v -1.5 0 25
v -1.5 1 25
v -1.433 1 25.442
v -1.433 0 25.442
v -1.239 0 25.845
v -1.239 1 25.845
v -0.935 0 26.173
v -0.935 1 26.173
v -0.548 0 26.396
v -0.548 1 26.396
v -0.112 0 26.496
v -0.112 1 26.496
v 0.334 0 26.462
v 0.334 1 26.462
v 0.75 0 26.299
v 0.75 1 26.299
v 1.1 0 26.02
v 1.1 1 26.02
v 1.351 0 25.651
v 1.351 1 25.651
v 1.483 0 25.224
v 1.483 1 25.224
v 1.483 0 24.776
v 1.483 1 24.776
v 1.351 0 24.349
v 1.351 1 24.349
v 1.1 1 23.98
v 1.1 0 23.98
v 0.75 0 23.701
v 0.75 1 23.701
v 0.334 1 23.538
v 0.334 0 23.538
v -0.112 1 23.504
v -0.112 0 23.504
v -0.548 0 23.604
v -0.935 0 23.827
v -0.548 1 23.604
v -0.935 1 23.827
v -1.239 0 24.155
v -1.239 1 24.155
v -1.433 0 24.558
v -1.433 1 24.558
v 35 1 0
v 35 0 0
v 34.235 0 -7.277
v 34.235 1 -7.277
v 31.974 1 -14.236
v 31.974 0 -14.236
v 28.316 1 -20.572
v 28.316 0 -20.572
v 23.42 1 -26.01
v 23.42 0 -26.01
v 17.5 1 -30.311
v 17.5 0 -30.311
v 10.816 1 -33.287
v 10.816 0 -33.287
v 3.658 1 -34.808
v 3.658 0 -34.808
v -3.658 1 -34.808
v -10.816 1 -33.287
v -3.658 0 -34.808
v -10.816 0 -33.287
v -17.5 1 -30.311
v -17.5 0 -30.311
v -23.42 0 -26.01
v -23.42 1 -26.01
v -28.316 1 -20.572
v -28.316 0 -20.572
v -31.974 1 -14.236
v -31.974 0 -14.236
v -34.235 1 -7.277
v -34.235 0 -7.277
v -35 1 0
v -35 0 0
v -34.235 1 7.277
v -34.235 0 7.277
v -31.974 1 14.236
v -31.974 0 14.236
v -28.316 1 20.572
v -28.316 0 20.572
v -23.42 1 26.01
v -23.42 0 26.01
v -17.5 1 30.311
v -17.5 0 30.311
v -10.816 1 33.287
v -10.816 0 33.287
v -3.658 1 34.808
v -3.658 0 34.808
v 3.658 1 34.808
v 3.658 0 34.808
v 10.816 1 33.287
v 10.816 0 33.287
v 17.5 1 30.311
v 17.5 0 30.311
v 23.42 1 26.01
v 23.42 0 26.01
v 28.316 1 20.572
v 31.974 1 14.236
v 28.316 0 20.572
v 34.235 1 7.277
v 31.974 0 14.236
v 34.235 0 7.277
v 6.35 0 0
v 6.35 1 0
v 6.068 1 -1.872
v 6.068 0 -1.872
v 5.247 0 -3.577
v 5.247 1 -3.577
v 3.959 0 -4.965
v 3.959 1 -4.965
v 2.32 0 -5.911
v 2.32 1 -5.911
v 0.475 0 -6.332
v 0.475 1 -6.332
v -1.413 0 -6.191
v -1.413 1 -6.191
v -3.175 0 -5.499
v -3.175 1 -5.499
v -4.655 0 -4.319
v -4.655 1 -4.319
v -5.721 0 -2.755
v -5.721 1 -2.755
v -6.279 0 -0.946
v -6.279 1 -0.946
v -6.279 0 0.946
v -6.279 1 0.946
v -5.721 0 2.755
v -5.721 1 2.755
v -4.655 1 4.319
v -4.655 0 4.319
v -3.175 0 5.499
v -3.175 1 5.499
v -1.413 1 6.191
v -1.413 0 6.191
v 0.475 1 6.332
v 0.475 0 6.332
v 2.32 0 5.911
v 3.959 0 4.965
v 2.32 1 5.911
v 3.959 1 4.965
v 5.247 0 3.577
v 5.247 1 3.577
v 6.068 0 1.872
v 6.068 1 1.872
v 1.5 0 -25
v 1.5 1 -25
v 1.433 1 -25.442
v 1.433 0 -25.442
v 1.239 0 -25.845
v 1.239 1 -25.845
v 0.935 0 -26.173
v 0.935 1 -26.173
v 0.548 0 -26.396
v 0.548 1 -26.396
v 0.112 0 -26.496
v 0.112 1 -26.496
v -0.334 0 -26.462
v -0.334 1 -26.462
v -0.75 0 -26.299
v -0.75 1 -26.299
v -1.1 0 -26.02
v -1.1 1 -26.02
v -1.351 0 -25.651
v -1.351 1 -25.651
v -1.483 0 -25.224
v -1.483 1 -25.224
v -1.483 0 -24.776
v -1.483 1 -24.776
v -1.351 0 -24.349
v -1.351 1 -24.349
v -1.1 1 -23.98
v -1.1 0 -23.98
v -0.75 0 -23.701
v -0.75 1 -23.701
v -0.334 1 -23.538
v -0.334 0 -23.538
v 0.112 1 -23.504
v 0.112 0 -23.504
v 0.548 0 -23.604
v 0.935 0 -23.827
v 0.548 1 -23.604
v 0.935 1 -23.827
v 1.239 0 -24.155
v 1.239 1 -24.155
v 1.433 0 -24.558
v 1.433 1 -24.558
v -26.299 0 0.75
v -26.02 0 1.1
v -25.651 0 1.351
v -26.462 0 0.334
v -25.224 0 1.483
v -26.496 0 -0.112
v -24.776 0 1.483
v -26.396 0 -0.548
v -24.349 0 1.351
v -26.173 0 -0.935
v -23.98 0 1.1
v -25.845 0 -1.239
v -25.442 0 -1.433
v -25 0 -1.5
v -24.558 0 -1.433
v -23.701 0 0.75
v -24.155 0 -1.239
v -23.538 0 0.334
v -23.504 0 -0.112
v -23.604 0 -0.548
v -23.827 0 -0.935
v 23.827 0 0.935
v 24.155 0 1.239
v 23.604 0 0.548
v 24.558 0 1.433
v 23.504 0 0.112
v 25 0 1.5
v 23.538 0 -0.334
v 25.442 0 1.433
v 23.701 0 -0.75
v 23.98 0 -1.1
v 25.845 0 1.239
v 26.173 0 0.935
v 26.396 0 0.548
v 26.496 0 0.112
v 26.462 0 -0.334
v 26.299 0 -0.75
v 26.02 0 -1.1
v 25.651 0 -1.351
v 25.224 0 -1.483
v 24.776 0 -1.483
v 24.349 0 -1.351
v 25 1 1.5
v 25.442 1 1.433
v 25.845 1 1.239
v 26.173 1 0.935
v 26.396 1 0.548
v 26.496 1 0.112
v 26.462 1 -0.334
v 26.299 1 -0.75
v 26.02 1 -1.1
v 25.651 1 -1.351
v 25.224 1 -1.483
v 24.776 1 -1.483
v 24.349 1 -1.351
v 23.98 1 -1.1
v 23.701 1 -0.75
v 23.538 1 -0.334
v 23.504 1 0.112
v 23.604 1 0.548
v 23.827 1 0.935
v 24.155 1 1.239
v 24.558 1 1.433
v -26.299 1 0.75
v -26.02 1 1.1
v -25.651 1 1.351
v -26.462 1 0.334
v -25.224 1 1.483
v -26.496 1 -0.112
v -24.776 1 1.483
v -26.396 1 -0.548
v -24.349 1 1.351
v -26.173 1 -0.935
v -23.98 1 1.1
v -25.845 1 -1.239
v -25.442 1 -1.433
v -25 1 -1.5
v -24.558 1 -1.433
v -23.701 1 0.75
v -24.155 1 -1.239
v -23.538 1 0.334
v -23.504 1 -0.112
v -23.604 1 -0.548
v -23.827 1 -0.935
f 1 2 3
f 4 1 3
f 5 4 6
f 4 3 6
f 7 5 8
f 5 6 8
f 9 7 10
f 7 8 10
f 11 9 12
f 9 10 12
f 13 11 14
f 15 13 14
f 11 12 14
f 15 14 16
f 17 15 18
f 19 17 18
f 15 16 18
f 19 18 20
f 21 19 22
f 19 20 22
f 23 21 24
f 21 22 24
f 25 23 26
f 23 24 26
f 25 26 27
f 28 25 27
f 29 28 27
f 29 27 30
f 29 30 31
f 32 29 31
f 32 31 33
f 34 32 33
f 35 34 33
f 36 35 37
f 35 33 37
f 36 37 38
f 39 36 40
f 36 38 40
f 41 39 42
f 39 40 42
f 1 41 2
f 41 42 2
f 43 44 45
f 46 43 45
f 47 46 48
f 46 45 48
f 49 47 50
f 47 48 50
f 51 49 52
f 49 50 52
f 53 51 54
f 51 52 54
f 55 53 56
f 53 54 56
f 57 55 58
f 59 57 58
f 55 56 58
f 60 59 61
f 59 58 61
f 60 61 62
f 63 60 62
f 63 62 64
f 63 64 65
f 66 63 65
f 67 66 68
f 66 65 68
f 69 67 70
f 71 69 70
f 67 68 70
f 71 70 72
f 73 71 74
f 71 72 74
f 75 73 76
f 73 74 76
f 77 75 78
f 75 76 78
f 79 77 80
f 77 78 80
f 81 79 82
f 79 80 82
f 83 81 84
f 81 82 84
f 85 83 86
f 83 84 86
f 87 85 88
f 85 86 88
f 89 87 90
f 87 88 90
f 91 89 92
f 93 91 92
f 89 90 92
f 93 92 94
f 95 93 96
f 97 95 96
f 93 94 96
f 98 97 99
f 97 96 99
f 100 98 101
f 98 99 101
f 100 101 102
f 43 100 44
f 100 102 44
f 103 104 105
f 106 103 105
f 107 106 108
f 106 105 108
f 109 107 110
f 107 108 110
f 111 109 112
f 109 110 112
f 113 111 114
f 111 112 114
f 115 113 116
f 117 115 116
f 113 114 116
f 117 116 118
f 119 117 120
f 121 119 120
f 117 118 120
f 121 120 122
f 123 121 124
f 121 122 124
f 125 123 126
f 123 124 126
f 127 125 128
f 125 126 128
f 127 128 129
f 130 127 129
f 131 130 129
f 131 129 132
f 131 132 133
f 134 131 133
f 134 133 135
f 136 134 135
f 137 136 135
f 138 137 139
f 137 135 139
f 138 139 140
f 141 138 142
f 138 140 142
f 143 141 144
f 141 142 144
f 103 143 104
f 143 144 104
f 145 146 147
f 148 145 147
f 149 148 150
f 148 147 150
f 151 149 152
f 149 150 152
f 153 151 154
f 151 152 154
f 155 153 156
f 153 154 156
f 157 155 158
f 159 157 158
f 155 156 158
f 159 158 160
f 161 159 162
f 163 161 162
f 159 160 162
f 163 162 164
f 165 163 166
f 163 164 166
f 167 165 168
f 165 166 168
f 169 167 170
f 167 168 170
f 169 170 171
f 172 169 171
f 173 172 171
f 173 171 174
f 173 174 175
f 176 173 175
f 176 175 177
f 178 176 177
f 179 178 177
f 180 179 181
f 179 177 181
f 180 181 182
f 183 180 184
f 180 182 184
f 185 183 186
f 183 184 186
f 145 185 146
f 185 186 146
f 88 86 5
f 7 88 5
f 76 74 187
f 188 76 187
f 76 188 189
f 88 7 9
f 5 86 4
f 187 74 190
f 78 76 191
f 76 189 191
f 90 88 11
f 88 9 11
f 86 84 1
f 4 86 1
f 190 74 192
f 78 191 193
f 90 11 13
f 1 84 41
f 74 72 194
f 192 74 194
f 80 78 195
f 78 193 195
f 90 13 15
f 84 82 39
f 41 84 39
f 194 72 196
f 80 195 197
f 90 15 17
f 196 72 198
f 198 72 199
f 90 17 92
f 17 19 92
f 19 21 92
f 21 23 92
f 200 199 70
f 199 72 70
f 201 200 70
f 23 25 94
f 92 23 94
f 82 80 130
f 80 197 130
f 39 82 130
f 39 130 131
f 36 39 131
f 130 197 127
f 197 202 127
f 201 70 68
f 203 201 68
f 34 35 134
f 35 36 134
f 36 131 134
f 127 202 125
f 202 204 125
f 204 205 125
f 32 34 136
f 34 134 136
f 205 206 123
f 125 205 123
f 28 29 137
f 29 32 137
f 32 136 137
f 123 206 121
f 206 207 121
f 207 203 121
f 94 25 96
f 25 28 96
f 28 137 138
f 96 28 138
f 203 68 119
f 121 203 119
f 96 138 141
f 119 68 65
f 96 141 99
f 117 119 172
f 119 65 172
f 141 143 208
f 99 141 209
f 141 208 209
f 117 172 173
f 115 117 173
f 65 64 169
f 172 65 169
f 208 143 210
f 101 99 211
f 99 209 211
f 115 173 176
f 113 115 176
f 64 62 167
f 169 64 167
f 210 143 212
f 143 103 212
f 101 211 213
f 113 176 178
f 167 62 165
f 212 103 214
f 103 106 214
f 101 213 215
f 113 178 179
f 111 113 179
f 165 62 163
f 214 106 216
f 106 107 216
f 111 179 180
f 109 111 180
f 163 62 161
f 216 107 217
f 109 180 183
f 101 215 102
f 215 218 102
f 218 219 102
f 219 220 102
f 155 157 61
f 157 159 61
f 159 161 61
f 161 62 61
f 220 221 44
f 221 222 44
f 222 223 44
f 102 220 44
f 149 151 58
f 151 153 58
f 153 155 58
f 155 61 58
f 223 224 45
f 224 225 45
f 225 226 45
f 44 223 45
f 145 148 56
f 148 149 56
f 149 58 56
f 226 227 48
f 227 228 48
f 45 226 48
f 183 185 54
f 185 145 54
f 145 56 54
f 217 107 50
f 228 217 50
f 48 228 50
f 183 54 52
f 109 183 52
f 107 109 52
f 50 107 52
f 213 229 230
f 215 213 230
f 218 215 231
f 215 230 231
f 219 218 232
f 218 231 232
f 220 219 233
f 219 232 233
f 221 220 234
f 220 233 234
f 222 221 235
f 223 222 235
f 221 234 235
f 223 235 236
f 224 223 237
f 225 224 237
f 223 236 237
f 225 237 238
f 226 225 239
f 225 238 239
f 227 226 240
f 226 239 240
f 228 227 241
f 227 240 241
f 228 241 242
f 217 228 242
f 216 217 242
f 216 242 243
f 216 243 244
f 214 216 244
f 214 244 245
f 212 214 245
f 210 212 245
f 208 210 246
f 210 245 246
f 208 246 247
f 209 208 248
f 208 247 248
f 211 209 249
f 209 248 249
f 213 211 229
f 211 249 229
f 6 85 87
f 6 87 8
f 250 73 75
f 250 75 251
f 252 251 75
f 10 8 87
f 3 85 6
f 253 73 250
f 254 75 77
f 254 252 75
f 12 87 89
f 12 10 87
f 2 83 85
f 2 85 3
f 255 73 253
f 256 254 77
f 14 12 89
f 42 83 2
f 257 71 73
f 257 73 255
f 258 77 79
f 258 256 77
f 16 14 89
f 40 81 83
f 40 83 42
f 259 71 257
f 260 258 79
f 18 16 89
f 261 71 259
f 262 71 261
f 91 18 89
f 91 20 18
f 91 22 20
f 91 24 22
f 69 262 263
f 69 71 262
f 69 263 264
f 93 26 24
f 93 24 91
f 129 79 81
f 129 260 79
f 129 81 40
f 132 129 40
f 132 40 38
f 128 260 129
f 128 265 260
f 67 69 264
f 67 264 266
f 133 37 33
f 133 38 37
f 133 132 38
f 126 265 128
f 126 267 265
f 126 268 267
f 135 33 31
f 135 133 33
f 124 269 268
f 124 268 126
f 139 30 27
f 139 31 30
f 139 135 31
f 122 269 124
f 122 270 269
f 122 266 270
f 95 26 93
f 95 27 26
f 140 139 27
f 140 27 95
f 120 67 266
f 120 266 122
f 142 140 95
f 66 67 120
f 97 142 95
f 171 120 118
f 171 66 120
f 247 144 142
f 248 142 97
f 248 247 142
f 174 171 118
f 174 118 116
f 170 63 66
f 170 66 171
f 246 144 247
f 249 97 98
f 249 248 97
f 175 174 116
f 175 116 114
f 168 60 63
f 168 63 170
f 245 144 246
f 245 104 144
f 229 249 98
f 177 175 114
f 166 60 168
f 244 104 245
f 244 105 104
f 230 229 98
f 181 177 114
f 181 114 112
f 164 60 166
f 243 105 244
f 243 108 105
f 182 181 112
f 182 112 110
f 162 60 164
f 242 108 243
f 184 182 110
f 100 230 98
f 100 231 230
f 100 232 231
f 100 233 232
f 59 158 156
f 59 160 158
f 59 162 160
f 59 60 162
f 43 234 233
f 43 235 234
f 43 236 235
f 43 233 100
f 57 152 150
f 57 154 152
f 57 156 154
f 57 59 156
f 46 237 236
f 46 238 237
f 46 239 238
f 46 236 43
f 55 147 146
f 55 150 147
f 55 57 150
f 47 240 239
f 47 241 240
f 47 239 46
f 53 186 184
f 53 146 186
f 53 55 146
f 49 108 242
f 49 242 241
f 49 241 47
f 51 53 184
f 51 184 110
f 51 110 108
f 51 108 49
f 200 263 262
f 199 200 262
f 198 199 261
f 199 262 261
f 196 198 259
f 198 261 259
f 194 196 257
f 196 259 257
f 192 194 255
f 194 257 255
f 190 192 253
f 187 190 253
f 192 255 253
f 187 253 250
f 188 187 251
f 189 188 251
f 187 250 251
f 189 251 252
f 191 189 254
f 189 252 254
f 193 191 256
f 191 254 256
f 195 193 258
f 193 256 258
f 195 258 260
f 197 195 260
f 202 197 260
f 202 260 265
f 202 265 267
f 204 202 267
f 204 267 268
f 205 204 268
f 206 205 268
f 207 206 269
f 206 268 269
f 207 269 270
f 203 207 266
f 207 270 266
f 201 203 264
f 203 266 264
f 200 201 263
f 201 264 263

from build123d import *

# Parameters (mm, degrees)
SKETCH1_R           = 35
BOSS_EXTRUDE1_DEPTH = 1
SKETCH2_R           = 6.35
CUT_EXTRUDE1_DEPTH  = 1
SKETCH3_R           = 1.5
CUT_EXTRUDE4_DEPTH  = 1
CIRPATTERN1_COUNT   = 4


with BuildPart() as part:
    # Sketch1 → Boss-Extrude1 (new body)
    with BuildSketch(Plane(origin=(0, 0, 0), x_dir=(1, 0, 0), z_dir=(0, 1, 0))):
        Circle(SKETCH1_R)
    extrude(amount=BOSS_EXTRUDE1_DEPTH)

    # Sketch2 → Cut-Extrude1 (cut)
    with BuildSketch(Plane(origin=(0, 1, 0), x_dir=(1, 0, 0), z_dir=(0, 1, 0))):
        Circle(SKETCH2_R)
    extrude(amount=-CUT_EXTRUDE1_DEPTH, mode=Mode.SUBTRACT)

    # Sketch3 → Cut-Extrude4 (cut)
    with BuildSketch(Plane(origin=(0, 1, 0), x_dir=(1, 0, 0), z_dir=(0, 1, 0))):
        with Locations((0, 25)):
            Circle(SKETCH3_R)
    cut_extrude4 = extrude(amount=-CUT_EXTRUDE4_DEPTH, mode=Mode.SUBTRACT)

    # CirPattern1: Cut-Extrude4 ×4 about axis
    cirpattern1_axis = Axis((0, 1.05, 0), (0, -1, 0))
    for i in range(1, CIRPATTERN1_COUNT):
        add(cut_extrude4.rotate(cirpattern1_axis, i * 360 / CIRPATTERN1_COUNT), mode=Mode.SUBTRACT)


solid = part.part
